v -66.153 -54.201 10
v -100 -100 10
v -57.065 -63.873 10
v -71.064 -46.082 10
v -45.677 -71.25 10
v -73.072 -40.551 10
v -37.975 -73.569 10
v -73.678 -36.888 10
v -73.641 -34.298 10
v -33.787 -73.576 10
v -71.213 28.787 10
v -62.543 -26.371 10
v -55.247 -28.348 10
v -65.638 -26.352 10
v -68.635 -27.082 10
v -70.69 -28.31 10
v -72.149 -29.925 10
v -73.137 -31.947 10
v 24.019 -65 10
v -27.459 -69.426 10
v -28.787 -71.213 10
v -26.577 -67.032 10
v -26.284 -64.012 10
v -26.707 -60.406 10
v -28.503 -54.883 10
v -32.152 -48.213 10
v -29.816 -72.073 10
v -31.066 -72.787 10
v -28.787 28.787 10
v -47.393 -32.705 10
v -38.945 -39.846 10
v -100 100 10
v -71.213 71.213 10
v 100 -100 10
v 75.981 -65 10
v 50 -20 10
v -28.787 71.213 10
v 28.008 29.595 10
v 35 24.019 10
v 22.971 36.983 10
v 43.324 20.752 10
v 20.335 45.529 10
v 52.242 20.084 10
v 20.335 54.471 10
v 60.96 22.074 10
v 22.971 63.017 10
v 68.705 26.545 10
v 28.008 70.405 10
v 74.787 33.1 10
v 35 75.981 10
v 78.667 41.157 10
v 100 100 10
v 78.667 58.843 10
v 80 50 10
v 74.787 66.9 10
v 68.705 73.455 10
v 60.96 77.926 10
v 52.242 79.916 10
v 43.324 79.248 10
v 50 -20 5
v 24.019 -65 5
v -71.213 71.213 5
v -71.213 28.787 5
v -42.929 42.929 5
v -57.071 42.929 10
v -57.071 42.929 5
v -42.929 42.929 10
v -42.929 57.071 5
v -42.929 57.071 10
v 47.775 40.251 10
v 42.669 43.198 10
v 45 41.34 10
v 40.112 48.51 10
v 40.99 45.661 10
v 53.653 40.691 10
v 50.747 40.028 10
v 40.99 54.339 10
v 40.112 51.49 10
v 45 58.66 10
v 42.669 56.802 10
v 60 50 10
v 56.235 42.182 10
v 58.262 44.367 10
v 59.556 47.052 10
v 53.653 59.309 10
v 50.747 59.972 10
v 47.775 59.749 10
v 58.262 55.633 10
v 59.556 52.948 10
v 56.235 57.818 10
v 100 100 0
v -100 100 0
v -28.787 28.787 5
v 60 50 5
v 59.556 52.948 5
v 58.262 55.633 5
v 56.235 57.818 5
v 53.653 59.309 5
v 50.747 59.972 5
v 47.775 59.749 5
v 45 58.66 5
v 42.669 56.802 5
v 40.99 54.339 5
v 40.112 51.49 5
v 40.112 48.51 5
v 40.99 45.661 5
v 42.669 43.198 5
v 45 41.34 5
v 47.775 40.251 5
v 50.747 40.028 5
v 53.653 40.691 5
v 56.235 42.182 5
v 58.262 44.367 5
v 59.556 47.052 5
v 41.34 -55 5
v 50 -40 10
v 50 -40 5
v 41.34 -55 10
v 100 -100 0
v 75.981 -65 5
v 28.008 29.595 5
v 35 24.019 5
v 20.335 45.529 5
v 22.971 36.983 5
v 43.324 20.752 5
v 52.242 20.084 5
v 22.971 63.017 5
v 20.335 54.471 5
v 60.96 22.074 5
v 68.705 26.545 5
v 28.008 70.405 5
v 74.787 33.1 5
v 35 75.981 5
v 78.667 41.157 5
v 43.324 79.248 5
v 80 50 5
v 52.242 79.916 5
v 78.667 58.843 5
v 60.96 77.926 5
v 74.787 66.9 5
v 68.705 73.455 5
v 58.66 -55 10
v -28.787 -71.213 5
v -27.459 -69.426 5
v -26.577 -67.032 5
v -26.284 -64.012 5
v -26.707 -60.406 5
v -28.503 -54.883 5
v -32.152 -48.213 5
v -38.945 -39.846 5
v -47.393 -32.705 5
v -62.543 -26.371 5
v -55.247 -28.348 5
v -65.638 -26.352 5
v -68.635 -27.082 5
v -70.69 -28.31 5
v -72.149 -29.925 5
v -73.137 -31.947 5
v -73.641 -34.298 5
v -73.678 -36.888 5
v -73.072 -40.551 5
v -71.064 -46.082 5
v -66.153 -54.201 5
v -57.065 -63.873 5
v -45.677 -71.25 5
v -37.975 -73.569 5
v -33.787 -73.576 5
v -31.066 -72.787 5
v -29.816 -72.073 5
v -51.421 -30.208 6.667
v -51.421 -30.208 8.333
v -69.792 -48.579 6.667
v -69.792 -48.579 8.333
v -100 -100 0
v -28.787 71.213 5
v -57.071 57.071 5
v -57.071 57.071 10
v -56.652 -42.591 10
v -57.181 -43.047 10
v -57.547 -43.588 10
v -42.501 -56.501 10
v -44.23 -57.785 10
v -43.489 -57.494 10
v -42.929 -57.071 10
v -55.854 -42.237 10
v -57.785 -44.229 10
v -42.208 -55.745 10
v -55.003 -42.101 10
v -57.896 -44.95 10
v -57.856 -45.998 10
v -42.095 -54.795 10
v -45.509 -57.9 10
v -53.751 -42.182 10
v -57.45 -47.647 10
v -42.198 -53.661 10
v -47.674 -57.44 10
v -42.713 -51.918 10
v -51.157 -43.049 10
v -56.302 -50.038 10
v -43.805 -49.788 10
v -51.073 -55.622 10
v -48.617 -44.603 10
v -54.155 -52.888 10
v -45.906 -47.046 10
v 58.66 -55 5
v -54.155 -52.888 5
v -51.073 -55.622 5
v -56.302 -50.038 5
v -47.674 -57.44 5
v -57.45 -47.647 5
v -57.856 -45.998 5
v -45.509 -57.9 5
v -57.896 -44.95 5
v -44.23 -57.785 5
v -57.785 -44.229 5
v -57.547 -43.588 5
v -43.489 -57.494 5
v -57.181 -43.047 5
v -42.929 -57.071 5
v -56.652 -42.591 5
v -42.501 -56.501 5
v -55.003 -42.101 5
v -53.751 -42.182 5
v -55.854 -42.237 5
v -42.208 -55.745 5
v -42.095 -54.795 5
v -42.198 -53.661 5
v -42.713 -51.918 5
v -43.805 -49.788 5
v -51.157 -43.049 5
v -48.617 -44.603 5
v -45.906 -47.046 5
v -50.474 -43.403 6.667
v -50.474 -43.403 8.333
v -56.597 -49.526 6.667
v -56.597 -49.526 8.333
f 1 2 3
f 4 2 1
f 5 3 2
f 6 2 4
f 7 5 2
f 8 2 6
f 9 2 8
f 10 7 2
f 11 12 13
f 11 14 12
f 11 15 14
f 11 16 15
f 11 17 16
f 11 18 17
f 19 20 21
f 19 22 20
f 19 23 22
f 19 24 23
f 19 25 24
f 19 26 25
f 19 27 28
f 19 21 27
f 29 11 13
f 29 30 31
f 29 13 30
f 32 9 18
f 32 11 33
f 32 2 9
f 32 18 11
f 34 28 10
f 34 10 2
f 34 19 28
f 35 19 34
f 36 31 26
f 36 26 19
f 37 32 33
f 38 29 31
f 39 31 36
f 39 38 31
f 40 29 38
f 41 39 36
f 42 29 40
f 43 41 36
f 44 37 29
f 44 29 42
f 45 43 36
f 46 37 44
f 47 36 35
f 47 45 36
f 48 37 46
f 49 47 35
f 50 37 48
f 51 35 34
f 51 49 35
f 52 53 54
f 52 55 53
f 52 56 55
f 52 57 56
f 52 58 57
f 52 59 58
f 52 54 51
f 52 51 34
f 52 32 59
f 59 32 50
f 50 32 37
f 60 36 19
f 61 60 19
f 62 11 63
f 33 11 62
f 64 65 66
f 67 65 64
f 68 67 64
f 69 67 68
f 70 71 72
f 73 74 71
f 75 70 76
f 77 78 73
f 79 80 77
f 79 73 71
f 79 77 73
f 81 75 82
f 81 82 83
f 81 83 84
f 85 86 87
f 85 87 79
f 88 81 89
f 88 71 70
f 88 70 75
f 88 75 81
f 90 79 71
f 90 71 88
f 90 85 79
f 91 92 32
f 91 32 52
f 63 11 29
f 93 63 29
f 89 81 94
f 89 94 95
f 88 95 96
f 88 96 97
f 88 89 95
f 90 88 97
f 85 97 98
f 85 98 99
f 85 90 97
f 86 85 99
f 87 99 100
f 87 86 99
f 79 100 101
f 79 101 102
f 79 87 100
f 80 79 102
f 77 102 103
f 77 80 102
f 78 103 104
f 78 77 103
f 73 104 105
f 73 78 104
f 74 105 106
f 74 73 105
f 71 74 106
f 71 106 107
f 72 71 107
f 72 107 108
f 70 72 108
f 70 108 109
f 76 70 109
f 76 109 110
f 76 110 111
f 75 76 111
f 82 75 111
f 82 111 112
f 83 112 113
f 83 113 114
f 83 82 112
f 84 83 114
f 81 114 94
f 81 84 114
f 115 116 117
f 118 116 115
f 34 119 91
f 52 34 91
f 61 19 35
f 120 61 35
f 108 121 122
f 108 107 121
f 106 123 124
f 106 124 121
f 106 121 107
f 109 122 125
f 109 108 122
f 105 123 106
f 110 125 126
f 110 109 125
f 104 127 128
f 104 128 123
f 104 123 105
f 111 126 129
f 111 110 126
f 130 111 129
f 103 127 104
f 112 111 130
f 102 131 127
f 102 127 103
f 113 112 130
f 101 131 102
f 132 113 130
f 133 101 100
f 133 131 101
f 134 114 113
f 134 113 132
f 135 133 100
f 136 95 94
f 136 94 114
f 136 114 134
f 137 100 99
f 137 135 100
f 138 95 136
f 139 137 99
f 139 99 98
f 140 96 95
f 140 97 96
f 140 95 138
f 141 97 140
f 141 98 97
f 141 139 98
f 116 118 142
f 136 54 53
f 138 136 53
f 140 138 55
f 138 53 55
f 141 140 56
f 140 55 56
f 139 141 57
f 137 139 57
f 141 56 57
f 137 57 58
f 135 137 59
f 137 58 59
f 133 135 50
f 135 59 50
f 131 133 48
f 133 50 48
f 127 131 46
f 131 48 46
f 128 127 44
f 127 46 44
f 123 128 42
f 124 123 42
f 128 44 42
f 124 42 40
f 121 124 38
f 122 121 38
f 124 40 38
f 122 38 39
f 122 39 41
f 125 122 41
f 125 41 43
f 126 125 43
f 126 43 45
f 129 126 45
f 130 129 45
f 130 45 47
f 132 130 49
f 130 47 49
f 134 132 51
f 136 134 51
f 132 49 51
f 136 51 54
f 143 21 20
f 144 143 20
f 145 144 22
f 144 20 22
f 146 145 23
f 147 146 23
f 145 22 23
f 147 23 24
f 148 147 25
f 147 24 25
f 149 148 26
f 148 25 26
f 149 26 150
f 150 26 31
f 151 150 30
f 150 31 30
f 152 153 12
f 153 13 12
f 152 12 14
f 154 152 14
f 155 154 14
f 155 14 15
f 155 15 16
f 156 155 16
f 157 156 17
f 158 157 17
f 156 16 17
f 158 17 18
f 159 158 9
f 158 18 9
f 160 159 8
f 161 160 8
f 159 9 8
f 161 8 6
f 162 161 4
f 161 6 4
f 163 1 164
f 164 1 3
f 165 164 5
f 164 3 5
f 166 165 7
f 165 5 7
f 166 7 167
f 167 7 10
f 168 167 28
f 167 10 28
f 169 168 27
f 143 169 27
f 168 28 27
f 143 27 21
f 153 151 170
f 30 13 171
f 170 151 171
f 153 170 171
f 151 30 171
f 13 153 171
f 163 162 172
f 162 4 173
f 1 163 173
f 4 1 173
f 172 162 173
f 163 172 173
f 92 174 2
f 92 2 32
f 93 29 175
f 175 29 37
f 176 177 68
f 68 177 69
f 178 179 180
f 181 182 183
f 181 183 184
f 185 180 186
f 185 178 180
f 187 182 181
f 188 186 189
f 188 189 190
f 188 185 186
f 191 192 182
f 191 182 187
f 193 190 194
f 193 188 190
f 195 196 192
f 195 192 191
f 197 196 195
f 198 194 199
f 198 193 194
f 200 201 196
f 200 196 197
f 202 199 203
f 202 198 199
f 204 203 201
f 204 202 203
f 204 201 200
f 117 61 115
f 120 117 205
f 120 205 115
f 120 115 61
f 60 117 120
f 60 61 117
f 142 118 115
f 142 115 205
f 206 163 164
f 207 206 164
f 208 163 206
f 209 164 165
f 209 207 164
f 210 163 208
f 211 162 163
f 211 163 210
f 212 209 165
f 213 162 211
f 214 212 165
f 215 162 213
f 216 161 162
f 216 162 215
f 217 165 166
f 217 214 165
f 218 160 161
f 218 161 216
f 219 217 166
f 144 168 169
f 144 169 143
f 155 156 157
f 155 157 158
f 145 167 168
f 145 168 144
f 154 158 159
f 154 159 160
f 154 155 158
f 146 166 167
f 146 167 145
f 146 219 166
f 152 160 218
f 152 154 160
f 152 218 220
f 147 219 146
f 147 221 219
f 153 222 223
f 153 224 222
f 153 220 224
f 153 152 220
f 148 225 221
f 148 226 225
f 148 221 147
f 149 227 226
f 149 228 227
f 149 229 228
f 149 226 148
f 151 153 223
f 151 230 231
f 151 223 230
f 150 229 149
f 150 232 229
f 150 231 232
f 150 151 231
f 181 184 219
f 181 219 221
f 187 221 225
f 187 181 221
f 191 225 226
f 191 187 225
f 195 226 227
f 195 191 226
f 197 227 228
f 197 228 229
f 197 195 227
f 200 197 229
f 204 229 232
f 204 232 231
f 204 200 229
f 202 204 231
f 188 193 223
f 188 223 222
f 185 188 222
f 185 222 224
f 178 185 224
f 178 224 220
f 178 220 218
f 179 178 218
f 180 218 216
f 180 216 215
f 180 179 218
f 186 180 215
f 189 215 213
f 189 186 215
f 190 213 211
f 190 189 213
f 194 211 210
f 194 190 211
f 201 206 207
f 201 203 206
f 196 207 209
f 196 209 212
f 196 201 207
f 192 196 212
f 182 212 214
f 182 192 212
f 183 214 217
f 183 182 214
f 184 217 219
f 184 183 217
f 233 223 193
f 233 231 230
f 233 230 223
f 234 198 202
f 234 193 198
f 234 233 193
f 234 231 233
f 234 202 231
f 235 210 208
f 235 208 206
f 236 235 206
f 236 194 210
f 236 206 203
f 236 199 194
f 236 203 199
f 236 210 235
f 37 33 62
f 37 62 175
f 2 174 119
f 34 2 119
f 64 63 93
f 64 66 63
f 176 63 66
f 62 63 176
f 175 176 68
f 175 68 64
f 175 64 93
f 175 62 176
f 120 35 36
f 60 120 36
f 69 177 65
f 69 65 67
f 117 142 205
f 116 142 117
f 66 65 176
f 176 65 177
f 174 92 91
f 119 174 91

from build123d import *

# Parameters (mm, degrees)
SKETCH_W      = 200
SKETCH_H      = 200
PAD_DEPTH     = 10
SKETCH001_R   = 30
SKETCH001_R_2 = 10
SKETCH001_W   = 42.426406
SKETCH001_H   = 42.426406
SKETCH001_W_2 = 14.142136
SKETCH001_H_2 = 14.142136
POCKET_DEPTH  = 5


with BuildPart() as part:
    # Sketch → Pad (new body)
    with BuildSketch(Plane.XY):
        Rectangle(SKETCH_W, SKETCH_H)
    extrude(amount=PAD_DEPTH)

    # Sketch001 (on Face6 of Pad) → Pocket (cut)
    with BuildSketch(Plane.XY.offset(10)):
        with Locations((50, 50)):
            Circle(SKETCH001_R)
        with Locations((50, 50)):
            Circle(SKETCH001_R_2, mode=Mode.SUBTRACT)
        with BuildLine():
            add(Edge.make_bspline(
                [(-28.786797, -71.213203), (-10.415623, -52.84203), (-51.421015, -30.207812), (-92.426407, -7.573593), (-69.792188, -48.578985), (-47.15797, -89.584377), (-28.786797, -71.213203)],
                knots=[0, 0, 0, 2.094395, 2.094395, 4.18879, 4.18879, 6.283185, 6.283185, 6.283185], degree=2, weights=[1, 0.5, 1, 0.5, 1, 0.5, 1]))
        make_face()
        with BuildLine():
            add(Edge.make_bspline(
                [(-42.928932, -57.071068), (-36.805208, -50.947343), (-50.473672, -43.402604), (-64.142136, -35.857864), (-56.597396, -49.526328), (-49.052657, -63.194792), (-42.928932, -57.071068)],
                knots=[0, 0, 0, 2.094395, 2.094395, 4.18879, 4.18879, 6.283185, 6.283185, 6.283185], degree=2, weights=[1, 0.5, 1, 0.5, 1, 0.5, 1]))
        make_face(mode=Mode.SUBTRACT)
        Polygon((75.980762, -65), (50, -20), (24.019238, -65), align=None)
        Polygon((58.660254, -55), (50, -40), (41.339746, -55), align=None, mode=Mode.SUBTRACT)
        with Locations((-50, 50)):
            Rectangle(SKETCH001_W, SKETCH001_H)
        with Locations((-50, 50)):
            Rectangle(SKETCH001_W_2, SKETCH001_H_2, mode=Mode.SUBTRACT)
    extrude(amount=-POCKET_DEPTH, mode=Mode.SUBTRACT)


solid = part.part
